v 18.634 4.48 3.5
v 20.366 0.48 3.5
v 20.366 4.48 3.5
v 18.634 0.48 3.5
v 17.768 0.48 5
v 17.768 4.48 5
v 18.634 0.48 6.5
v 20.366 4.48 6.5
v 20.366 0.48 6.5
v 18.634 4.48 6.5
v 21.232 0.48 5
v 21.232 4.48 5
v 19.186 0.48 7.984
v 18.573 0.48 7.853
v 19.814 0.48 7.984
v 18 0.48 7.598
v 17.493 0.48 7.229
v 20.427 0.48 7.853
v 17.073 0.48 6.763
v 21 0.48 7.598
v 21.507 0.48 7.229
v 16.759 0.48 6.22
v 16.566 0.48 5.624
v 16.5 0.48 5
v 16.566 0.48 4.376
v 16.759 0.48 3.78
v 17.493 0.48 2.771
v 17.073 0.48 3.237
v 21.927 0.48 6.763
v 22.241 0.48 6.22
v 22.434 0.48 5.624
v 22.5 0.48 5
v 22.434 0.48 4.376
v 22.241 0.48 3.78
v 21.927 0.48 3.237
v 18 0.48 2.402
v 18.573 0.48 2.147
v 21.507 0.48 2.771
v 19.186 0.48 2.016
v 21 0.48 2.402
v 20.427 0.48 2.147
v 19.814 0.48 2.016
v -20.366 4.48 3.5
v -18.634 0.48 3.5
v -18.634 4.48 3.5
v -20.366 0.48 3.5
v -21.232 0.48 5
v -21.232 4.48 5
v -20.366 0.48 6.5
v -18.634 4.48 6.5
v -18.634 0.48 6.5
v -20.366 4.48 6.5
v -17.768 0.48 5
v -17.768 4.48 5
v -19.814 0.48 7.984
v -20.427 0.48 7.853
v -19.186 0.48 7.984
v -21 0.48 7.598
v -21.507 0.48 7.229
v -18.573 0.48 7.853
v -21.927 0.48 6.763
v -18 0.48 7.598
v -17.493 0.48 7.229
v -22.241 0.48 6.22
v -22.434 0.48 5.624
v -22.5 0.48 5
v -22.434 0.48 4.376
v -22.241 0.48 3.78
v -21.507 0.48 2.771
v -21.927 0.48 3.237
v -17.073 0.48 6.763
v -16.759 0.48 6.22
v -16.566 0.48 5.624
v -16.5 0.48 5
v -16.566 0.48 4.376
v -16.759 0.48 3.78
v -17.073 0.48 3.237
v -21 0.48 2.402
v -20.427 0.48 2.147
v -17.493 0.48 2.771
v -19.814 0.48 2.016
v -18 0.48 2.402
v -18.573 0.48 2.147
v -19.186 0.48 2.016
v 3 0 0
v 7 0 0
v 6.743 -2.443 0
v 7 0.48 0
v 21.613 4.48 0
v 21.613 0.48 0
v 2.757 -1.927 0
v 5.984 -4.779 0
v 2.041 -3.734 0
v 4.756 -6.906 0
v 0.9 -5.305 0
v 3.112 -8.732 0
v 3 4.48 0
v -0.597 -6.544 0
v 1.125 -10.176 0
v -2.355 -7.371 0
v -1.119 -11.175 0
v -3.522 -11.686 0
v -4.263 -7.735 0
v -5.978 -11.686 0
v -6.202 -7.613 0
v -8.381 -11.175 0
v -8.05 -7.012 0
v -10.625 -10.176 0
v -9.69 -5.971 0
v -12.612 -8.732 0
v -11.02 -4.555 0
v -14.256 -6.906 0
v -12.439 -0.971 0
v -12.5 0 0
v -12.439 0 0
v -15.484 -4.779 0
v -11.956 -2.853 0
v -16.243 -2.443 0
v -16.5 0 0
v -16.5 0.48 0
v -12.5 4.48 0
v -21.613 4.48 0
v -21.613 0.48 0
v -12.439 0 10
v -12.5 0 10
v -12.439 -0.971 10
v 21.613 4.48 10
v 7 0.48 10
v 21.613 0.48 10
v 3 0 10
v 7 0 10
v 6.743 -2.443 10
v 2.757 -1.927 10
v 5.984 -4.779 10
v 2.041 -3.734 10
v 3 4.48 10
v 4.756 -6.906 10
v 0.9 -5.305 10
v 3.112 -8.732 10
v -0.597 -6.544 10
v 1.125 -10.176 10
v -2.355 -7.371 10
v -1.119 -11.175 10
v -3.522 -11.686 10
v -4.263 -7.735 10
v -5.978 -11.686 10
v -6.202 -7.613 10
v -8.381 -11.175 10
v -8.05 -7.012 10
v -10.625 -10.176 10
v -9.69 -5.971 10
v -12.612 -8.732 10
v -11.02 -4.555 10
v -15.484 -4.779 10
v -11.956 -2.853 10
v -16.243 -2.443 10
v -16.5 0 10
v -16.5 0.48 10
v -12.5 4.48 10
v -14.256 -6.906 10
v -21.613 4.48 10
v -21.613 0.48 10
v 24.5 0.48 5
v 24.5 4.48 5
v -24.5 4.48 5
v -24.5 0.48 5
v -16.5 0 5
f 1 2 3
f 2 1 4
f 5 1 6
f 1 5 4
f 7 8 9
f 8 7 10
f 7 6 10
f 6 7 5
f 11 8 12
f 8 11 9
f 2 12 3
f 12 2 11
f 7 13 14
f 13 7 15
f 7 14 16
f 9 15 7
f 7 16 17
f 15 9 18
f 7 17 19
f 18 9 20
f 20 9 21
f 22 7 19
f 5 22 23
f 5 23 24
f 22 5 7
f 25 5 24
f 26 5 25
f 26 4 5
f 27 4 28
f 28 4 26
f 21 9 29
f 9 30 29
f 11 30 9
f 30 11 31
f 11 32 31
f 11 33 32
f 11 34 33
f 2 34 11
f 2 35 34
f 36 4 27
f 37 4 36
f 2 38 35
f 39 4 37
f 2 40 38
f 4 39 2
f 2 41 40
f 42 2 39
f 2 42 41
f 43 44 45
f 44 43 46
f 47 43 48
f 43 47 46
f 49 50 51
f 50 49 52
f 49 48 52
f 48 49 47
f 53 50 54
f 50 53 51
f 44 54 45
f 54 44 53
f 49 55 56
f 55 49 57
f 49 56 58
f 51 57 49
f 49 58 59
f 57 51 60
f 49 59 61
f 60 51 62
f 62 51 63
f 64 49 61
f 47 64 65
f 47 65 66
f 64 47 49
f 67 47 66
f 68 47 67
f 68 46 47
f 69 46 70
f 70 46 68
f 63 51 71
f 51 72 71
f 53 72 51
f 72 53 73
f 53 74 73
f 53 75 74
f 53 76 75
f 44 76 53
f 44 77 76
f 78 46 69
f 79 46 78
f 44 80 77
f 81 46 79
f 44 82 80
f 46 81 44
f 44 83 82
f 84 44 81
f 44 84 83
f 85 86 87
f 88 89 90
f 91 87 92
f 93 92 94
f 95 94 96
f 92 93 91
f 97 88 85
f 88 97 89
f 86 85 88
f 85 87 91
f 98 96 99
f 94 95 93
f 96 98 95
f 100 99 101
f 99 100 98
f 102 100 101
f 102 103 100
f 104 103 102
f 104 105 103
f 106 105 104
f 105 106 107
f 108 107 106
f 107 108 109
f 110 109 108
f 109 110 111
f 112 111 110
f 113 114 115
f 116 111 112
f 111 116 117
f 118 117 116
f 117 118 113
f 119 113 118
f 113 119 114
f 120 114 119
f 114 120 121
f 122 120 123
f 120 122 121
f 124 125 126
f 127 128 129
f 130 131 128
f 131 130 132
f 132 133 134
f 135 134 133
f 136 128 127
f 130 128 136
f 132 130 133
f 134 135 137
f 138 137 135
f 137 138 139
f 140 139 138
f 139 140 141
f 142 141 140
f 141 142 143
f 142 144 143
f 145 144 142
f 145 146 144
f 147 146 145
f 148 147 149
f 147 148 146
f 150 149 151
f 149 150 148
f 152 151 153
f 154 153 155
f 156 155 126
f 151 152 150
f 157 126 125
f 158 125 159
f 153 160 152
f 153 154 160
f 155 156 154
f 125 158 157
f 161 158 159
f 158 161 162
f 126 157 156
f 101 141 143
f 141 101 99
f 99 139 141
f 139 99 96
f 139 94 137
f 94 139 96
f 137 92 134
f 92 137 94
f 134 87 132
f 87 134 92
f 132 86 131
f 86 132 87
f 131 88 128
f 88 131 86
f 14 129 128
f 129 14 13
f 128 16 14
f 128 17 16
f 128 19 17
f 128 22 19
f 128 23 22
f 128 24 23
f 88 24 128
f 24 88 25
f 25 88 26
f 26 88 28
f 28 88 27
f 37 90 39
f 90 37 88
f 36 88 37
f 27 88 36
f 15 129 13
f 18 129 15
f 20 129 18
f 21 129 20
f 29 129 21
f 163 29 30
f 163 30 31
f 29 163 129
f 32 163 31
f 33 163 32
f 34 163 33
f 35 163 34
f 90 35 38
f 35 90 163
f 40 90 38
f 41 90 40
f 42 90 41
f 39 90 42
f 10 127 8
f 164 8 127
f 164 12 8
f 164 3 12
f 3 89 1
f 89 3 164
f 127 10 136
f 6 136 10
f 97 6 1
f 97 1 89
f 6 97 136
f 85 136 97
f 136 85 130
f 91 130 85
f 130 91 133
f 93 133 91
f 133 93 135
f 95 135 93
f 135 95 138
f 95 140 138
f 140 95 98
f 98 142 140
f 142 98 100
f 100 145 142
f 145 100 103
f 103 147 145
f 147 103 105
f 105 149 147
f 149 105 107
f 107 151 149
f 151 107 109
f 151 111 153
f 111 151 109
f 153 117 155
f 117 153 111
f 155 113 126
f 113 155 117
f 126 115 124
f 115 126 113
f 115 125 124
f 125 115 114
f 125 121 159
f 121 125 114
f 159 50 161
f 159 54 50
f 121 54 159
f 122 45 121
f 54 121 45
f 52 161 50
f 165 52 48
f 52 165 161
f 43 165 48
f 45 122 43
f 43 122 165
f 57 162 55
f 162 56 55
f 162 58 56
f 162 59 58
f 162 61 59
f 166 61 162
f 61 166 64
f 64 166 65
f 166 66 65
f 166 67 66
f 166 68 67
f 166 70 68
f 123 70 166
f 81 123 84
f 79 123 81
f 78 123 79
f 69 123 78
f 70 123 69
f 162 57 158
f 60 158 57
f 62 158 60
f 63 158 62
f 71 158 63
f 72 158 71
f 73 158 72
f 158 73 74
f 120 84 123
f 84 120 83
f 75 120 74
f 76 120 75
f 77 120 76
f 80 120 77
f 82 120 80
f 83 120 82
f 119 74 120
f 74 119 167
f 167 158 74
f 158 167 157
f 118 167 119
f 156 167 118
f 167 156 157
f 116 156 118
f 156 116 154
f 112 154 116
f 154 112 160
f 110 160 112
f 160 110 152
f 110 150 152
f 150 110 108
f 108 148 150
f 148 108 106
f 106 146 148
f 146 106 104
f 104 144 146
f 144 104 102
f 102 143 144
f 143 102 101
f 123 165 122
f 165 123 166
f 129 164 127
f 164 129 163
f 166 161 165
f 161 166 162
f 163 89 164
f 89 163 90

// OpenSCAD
// file: wallace.scad
rod_size = 8;
rod_nut_size = 15; //12 for M6, 15 for M8
bearing_size = 15.5; //12.5 for LM6UU, 15.5 for LM8UU,LM8SUU
bearing_length = 24.5; //19.5 for LM6UU, 17.5 for LM8SUU, 24.5 for LM8UU
yz_motor_distance = 25;
motor_screw_spacing = 31; //26 for NEMA14, 31 for NEMA17
motor_casing = 45; //38 for NEMA14, 45 for NEMA17
end_height = 55; //measure the height of your motor casing and add 4mm. Suggestion: 40 for NEMA14, 55 for NEMA17
bed_mount_height = 16;
//x_rod_spacing = motor_screw_spacing + 3 + rod_size;
x_rod_spacing = 30;
x_carriage_width = 70;
carriage_extruder_offset = 5;
pulley_size = 20;
idler_pulley_width = 10;
gusset_size = 15;
m3_size = 3;
m3_nut_size = 6;
m4_size = 4;
motor_shaft_size = 5;
// ratio for converting diameter to apothem
da6 = 1 / cos(180 / 6) / 2;
da8 = 1 / cos(180 / 8) / 2;
// main file
include <wallace.scad>;
intersection() {
	difference() {
		linear_extrude(height = 10, convexity = 5) difference() {
			union() {
				intersection() {
					translate([-yz_motor_distance / 2 + bearing_size / 2, 0, 0]) circle(bearing_size / 2 + 4);
					translate([-yz_motor_distance / 2 + bearing_size / 2 - bearing_size / 2 - 4, -bearing_size, 0]) square([bearing_size + 8, bearing_size]);
				}
				translate([-yz_motor_distance / 2 + bearing_size / 2 - bearing_size / 2 - 4, 0, 0]) square([bearing_size + 8, bearing_size * sqrt(2) / 4 - 1]);
				translate([0, bearing_size * sqrt(2) / 4 - 3, 0]) square([yz_motor_distance + motor_casing - motor_screw_spacing + 10, 4], center = true);
			}
			translate([-yz_motor_distance / 2 + bearing_size / 2, 0, 0]) circle(bearing_size / 2);
			translate([-yz_motor_distance / 2 + bearing_size / 2 - bearing_size / 2, 0, 0]) square(bearing_size);
		}
		//screw holes
		for(side = [1, -1]) translate([side * (yz_motor_distance + motor_casing - motor_screw_spacing) / 2, 0, 5]) rotate(90) rotate([90, 0, 90]) {
			cylinder(r = m3_size * da6, h = bearing_size, center = true, $fn = 6);
			translate([0, 0, bearing_size * sqrt(2) / 4 - 5]) rotate([180, 0, 0]) cylinder(r = m3_size, h = bearing_size, $fn = 30);
		}
	}
	translate([0, 0, 5]) rotate(90) rotate([90, 0, 90]) cylinder(r = (yz_motor_distance + motor_casing - motor_screw_spacing + 10) / 2, h = bearing_size + 10, center = true, $fn = 6);
}
